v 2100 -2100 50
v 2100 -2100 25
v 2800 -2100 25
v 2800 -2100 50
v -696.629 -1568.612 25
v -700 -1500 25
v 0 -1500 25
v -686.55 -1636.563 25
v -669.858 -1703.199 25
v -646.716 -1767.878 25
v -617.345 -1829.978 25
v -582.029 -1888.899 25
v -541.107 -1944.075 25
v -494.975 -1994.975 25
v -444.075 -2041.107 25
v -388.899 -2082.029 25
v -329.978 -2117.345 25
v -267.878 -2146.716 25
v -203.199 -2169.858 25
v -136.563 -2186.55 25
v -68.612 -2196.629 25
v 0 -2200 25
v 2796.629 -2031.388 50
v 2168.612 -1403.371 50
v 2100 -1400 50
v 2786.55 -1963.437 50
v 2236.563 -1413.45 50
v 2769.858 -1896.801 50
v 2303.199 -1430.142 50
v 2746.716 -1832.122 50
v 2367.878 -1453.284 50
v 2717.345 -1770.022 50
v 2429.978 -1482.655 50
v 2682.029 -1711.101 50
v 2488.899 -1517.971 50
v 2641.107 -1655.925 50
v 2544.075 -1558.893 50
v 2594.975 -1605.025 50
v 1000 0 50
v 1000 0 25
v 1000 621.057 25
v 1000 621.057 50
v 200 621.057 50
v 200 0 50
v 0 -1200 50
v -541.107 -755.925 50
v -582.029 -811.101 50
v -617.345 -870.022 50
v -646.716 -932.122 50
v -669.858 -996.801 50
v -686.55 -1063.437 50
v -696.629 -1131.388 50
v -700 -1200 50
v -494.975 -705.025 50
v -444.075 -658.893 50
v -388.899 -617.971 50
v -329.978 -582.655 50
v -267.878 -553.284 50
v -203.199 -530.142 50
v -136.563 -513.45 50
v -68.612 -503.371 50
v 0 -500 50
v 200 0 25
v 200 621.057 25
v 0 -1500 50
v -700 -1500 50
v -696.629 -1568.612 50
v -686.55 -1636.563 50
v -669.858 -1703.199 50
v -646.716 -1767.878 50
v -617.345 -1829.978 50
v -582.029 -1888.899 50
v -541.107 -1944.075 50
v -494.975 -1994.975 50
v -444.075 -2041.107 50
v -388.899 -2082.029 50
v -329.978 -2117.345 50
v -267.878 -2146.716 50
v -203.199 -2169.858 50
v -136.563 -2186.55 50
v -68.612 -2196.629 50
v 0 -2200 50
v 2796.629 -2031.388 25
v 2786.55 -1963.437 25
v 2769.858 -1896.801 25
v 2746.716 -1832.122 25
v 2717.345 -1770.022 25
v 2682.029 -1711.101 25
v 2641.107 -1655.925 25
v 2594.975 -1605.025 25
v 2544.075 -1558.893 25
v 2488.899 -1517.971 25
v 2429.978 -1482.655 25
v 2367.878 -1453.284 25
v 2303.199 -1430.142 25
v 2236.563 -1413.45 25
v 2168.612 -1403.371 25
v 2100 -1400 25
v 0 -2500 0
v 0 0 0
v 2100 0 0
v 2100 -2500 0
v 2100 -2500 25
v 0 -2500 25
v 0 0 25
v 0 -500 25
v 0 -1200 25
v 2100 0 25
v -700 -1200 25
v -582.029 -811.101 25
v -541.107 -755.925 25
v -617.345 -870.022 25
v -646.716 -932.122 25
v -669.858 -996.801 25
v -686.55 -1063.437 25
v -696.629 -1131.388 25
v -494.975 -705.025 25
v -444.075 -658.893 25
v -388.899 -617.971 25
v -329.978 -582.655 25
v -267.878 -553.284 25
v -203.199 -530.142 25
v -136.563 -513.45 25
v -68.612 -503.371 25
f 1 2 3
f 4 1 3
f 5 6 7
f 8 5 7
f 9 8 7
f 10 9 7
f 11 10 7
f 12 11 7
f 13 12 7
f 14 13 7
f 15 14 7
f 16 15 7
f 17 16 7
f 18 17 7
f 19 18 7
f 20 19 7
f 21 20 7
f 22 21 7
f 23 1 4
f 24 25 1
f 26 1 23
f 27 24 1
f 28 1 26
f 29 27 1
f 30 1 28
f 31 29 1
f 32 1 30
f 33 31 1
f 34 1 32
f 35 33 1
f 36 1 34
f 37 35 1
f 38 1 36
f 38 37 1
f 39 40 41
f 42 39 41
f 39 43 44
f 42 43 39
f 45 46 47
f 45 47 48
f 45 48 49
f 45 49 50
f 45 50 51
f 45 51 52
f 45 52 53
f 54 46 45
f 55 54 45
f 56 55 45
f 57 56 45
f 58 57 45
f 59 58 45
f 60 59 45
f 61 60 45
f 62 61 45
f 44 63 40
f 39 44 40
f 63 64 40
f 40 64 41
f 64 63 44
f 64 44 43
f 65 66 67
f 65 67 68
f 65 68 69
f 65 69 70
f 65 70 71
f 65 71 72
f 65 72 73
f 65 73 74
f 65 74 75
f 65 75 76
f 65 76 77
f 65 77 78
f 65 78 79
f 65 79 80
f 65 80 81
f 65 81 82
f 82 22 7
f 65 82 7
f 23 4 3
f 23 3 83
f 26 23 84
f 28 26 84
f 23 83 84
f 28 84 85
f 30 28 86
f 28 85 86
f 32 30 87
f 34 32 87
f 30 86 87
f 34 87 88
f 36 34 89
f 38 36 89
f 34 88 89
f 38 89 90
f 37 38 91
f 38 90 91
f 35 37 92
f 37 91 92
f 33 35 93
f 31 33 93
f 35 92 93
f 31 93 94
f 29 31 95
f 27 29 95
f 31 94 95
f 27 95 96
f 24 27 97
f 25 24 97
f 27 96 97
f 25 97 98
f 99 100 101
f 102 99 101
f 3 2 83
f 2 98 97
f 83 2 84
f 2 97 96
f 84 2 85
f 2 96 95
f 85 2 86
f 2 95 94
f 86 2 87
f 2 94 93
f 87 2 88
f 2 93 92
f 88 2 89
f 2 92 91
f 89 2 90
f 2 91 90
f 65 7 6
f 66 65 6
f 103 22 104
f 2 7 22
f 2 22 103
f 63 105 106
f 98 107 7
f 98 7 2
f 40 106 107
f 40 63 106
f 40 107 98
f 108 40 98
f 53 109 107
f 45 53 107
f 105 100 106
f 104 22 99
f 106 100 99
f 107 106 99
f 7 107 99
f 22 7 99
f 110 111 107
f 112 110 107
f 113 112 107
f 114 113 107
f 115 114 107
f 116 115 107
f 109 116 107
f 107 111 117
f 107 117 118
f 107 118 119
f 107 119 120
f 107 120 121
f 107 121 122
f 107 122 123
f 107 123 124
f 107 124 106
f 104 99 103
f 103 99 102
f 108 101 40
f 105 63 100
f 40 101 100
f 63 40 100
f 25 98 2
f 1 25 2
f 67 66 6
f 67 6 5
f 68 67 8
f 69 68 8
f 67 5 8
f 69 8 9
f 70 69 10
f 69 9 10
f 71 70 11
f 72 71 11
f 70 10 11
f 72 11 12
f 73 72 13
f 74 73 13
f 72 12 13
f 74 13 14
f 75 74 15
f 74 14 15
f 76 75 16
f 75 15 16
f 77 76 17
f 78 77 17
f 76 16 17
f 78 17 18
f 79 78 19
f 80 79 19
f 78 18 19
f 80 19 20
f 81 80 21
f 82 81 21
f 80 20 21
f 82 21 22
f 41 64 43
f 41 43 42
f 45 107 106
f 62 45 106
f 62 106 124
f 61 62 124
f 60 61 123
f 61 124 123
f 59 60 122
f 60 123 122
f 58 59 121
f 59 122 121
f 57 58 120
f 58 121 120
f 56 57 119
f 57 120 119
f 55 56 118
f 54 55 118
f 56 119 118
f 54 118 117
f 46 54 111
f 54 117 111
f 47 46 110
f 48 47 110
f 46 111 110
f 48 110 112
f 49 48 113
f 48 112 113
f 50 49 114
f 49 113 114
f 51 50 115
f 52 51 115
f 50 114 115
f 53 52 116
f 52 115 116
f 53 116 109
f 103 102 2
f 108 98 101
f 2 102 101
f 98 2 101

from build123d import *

# Parameters (mm, degrees)
F1_DEPTH = 25
F2_W     = 800
F2_H     = 621.0572361946
F3_DEPTH = 25


with BuildPart() as f1:
    # F0 (on Top) → F1 (new body)
    with BuildSketch(Plane.XY):
        with BuildLine():
            Line((2000, -2500), (2100, -2500))
            Line((2100, -2500), (2100, -2100))
            Line((2100, -2100), (2100, -1400))
            Line((2100, -1400), (2100, 0))
            Line((2100, 0), (1000, 0))
            Line((1000, 0), (200, 0))
            Line((200, 0), (0, 0))
            Line((0, 0), (0, -500))
            Line((0, -500), (0, -1200))
            Line((0, -1200), (0, -1500))
            Line((0, -1500), (0, -2200))
            Line((0, -2200), (0, -2500))
            Line((0, -2500), (100, -2500))
            Line((100, -2500), (100, -2050))
            ThreePointArc((100, -2050), (418.1980515339, -2181.8019484661), (550, -2500))
            ThreePointArc((550, -2500), (681.8019484661, -2181.8019484661), (1000, -2050))
            Line((1000, -2050), (1000, -2500))
            Line((1000, -2500), (1100, -2500))
            Line((1100, -2500), (1100, -2050))
            ThreePointArc((1100, -2050), (1418.1980515339, -2181.8019484661), (1550, -2500))
            ThreePointArc((1550, -2500), (1681.8019484661, -2181.8019484661), (2000, -2050))
            Line((2000, -2050), (2000, -2500))
        make_face()
        with BuildLine():
            Line((100, -2500), (550, -2500))
            ThreePointArc((550, -2500), (418.1980515339, -2181.8019484661), (100, -2050))
            Line((100, -2050), (100, -2500))
        make_face()
        with BuildLine():
            Line((550, -2500), (1000, -2500))
            Line((1000, -2500), (1000, -2050))
            ThreePointArc((1000, -2050), (681.8019484661, -2181.8019484661), (550, -2500))
        make_face()
        with BuildLine():
            Line((1100, -2500), (1550, -2500))
            ThreePointArc((1550, -2500), (1418.1980515339, -2181.8019484661), (1100, -2050))
            Line((1100, -2050), (1100, -2500))
        make_face()
        with BuildLine():
            Line((1550, -2500), (2000, -2500))
            Line((2000, -2500), (2000, -2050))
            ThreePointArc((2000, -2050), (1681.8019484661, -2181.8019484661), (1550, -2500))
        make_face()
    extrude(amount=F1_DEPTH)

    # F2 (on face) → F3 (join)
    with BuildSketch(Plane.XY.offset(25)):
        with BuildLine():
            Line((0, -2200), (0, -1500))
            Line((0, -1500), (-700, -1500))
            ThreePointArc((-700, -1500), (-494.9747468306, -1994.9747468306), (0, -2200))
        make_face()
        with BuildLine():
            Line((0, -1200), (0, -500))
            ThreePointArc((0, -500), (-494.9747468306, -705.0252531694), (-700, -1200))
            Line((-700, -1200), (0, -1200))
        make_face()
        with Locations((600, 310.5286180973)):
            Rectangle(F2_W, F2_H)
        with BuildLine():
            ThreePointArc((2800, -2100), (2594.9747468306, -1605.0252531694), (2100, -1400))
            Line((2100, -1400), (2100, -2100))
            Line((2100, -2100), (2800, -2100))
        make_face()
    extrude(amount=F3_DEPTH)


solid = f1.part
